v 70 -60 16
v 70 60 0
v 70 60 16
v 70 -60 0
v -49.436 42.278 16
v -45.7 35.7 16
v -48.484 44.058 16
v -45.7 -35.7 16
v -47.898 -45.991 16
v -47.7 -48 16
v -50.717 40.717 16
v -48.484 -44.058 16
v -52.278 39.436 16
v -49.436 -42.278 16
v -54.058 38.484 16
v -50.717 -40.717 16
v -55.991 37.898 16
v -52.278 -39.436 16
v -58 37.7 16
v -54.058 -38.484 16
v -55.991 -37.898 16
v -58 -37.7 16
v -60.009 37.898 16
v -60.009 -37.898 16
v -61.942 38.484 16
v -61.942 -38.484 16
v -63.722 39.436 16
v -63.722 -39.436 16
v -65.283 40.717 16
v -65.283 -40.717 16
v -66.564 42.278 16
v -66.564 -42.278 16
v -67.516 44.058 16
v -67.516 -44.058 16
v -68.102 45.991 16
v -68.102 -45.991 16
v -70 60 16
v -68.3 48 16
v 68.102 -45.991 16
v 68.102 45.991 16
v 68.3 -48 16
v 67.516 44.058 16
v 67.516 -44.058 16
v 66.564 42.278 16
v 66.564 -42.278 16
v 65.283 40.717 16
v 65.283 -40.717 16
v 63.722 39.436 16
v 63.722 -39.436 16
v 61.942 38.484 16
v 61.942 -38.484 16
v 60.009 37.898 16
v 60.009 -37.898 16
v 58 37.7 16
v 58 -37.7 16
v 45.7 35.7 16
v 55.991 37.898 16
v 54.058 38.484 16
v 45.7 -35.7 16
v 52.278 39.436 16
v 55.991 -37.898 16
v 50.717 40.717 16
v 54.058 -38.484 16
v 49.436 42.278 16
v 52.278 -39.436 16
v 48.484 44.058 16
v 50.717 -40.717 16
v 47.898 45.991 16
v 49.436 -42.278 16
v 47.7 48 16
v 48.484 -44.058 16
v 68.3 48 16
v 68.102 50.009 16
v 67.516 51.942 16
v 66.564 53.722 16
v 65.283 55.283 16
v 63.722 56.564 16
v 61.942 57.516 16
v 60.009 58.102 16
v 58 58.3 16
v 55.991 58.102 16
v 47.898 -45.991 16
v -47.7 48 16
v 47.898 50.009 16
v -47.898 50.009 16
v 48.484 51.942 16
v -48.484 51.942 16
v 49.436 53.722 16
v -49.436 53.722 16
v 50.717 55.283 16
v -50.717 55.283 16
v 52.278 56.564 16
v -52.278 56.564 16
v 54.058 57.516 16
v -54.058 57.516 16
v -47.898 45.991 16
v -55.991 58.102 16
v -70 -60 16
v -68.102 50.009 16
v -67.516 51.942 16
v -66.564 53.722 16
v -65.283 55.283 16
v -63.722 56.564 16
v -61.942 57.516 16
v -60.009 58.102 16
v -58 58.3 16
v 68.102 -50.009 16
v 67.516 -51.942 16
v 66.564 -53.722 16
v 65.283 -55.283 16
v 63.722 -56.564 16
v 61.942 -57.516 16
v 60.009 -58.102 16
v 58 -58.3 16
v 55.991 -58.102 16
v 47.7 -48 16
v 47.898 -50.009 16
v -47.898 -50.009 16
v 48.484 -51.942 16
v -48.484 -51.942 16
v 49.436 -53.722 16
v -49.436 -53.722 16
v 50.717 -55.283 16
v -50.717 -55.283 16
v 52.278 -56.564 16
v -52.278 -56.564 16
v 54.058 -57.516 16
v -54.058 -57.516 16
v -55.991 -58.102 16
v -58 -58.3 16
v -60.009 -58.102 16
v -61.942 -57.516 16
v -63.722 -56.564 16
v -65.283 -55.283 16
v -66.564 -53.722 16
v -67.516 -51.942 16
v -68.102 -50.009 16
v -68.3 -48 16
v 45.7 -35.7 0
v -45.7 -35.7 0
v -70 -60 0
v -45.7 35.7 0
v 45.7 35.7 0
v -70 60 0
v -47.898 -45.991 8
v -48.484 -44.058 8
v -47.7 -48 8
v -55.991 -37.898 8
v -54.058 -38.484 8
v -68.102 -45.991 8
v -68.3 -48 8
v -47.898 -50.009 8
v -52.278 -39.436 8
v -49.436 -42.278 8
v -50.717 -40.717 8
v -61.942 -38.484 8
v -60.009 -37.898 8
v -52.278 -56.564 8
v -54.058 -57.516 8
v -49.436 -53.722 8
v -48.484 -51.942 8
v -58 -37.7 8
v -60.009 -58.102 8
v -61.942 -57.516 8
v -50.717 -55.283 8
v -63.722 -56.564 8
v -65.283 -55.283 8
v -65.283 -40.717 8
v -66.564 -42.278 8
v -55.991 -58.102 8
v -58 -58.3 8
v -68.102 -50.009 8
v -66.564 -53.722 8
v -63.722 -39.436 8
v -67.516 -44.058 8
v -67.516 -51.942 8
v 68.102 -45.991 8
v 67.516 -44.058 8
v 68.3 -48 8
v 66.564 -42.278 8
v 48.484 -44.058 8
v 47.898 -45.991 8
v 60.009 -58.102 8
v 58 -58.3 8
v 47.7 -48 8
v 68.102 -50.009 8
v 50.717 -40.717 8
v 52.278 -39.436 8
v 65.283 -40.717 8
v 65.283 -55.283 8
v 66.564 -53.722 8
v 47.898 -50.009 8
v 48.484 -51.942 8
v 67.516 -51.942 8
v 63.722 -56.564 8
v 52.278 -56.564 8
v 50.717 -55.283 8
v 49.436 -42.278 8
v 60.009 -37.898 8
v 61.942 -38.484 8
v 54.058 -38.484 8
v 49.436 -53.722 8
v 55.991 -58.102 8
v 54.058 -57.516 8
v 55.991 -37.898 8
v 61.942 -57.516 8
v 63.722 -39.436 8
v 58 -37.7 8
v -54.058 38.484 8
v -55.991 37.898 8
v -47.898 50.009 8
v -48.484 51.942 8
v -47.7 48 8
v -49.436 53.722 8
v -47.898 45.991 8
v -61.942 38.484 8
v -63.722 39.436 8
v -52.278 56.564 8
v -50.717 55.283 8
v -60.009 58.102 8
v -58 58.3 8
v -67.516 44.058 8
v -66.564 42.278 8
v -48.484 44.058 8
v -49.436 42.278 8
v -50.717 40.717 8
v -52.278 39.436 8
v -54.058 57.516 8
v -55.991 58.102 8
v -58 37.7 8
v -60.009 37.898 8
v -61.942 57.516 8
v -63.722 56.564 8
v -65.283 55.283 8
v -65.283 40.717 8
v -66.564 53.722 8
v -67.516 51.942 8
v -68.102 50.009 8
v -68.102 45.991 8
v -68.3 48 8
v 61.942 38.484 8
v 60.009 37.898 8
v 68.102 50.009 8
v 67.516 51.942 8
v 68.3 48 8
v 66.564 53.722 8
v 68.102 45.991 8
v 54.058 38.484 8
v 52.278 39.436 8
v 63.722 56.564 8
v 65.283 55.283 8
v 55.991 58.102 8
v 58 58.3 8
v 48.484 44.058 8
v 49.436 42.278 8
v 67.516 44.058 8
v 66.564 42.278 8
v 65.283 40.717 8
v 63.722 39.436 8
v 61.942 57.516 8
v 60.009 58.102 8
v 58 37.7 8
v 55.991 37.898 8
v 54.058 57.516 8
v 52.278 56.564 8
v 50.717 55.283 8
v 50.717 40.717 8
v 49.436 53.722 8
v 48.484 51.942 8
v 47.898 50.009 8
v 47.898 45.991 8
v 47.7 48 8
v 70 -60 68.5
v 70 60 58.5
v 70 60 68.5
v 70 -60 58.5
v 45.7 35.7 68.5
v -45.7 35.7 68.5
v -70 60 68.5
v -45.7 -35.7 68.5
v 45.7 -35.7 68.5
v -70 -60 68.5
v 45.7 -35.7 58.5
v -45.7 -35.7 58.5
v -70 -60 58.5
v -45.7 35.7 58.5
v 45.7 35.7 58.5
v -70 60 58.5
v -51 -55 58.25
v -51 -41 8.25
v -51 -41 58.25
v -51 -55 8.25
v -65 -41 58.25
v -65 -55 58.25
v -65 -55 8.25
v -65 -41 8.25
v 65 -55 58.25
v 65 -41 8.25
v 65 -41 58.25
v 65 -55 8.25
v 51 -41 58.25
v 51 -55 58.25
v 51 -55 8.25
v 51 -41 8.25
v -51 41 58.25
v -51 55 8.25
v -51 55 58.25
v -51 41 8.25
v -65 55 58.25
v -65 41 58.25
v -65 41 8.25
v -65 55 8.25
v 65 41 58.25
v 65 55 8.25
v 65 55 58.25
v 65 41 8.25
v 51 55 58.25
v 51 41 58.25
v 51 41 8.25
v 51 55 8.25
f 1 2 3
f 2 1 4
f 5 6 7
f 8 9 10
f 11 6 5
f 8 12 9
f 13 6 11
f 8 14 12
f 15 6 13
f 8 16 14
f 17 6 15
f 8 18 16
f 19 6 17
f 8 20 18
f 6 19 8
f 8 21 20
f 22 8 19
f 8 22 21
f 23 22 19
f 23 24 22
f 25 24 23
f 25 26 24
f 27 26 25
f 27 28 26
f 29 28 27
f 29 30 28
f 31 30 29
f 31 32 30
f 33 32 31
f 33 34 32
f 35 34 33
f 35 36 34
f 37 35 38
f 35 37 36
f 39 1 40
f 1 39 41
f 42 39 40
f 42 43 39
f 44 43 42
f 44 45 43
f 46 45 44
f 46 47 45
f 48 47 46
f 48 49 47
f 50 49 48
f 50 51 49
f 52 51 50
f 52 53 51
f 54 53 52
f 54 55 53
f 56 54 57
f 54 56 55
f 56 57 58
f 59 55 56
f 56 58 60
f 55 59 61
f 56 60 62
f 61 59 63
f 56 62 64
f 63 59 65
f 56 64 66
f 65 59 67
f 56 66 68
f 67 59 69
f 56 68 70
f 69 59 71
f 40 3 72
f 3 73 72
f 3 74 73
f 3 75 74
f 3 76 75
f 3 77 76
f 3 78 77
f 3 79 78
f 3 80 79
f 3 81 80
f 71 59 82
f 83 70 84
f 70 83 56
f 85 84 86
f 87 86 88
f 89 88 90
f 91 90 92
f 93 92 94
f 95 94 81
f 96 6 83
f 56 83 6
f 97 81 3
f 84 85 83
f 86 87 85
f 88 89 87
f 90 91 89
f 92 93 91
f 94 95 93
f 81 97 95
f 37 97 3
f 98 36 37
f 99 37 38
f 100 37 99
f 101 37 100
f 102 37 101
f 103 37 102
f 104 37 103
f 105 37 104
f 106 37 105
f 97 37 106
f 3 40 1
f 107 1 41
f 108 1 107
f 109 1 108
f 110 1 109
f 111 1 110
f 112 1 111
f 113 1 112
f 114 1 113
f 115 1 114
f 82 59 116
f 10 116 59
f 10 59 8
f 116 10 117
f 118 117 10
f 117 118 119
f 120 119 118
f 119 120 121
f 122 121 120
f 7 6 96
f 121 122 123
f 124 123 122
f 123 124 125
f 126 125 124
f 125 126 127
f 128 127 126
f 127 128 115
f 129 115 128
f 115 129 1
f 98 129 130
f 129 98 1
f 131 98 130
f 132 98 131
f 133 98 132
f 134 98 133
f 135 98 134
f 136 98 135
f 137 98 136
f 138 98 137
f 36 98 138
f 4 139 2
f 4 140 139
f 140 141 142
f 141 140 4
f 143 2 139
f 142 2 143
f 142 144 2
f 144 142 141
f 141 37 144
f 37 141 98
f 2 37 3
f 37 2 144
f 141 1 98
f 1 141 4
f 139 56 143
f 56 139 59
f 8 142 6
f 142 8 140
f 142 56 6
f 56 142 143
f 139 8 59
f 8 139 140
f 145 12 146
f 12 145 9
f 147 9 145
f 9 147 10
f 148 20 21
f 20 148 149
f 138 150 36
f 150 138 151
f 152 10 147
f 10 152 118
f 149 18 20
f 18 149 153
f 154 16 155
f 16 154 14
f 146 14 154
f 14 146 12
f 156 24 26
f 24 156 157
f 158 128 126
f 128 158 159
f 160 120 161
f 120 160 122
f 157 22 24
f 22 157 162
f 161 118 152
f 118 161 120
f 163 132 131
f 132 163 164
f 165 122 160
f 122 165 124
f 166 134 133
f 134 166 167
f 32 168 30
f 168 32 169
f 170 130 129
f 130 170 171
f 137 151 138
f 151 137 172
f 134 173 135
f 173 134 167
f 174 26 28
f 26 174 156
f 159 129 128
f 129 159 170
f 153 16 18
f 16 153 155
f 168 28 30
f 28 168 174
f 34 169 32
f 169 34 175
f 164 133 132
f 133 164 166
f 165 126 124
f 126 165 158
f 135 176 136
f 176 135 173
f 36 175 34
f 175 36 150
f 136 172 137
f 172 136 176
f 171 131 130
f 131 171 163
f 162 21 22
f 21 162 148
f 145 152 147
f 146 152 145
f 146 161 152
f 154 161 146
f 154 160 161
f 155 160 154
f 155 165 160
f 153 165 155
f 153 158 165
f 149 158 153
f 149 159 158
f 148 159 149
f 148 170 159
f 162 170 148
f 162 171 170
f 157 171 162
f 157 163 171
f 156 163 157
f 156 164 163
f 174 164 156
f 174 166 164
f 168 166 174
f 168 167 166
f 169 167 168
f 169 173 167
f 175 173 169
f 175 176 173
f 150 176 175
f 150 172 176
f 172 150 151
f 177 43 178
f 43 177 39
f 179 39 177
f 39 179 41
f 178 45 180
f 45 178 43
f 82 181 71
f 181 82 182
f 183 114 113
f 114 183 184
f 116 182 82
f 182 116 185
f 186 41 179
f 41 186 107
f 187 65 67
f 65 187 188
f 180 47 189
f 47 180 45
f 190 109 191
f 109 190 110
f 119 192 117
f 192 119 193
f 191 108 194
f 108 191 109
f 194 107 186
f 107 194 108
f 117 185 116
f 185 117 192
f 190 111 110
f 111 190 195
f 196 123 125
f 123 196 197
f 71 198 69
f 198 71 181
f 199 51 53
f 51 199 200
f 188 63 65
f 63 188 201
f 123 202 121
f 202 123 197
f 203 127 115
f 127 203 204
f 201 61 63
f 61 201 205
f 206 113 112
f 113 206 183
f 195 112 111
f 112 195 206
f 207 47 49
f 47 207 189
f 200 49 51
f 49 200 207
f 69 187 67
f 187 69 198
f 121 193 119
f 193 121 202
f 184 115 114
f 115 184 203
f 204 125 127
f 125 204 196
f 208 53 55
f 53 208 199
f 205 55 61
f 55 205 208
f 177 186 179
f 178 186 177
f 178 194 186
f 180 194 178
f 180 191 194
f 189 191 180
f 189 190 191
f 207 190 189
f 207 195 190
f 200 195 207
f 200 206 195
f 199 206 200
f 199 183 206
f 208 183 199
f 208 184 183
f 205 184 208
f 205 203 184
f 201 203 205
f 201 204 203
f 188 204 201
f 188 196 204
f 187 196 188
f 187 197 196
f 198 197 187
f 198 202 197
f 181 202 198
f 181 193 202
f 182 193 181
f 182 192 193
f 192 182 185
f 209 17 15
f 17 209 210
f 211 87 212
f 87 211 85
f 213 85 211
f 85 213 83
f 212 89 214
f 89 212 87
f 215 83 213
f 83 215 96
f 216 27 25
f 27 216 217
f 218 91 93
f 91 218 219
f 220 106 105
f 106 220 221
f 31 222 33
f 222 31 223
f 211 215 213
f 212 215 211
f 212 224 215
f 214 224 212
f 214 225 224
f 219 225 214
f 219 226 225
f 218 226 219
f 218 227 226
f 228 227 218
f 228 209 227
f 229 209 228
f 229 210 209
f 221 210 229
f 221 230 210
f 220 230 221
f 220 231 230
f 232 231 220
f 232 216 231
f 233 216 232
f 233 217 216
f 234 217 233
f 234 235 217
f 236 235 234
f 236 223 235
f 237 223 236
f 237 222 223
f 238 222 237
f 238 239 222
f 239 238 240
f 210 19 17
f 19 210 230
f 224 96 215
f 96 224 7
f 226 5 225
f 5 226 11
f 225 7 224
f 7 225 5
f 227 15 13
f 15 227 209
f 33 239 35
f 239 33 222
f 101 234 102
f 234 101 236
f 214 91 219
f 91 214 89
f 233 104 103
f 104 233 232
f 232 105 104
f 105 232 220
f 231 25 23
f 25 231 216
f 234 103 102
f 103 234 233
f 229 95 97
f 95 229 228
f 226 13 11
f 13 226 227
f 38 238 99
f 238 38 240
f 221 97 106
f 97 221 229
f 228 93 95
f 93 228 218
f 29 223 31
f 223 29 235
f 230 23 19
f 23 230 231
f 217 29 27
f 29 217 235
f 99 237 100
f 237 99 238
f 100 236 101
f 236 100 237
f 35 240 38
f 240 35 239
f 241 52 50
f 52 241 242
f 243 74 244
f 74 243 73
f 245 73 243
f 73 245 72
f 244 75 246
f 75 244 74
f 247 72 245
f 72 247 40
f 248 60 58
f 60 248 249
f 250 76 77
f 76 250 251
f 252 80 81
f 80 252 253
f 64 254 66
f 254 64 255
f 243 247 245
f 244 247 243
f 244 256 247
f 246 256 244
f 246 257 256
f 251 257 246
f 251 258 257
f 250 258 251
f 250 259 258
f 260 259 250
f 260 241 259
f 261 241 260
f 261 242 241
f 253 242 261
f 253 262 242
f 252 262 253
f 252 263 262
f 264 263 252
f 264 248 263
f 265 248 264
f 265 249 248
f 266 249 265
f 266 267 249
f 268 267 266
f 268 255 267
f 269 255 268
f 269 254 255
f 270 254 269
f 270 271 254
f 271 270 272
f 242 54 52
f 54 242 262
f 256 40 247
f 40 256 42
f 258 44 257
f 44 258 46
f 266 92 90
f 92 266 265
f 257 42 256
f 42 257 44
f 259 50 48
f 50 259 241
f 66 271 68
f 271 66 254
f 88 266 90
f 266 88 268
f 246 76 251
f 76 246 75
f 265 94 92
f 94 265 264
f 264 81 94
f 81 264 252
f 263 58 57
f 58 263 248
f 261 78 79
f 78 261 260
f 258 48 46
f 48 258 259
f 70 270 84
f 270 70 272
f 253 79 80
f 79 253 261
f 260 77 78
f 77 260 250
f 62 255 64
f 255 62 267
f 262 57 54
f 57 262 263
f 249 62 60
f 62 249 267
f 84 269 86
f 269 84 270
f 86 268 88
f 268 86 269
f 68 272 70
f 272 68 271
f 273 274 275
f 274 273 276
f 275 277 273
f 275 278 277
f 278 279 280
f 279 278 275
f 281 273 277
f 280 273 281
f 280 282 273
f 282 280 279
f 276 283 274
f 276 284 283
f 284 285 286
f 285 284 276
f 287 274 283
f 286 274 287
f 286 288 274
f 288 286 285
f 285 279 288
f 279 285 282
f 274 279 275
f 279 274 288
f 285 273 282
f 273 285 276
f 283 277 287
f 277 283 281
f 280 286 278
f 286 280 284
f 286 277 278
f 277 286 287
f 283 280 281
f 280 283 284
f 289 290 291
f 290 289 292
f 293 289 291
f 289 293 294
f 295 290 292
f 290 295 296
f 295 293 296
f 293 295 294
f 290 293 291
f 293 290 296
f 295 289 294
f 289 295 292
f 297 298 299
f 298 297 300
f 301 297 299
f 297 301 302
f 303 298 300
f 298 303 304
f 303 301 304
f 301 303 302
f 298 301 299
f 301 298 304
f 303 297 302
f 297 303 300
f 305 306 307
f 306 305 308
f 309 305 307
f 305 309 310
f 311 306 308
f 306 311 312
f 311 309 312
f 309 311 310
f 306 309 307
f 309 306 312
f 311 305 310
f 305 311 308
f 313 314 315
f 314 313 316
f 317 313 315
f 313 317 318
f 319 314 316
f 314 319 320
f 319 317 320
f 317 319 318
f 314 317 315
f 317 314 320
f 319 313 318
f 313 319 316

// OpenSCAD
$fn = 32;

// ------------------------------------------------------------------------
// Frame cube: base 140 x 120 mm, posts 50 mm tall
// Every part is its own module, assembly() places every instance.
// ------------------------------------------------------------------------

// --- part 1 ---
module base_frame() {
  difference() {
    translate([-70, -60, 0]) cube([140, 120, 16]);
    translate([-45.7, -35.7, -1]) cube([91.4, 71.4, 18]);
    translate([-58, -48, 8]) cylinder(h = 9, d = 20.6);
    translate([58, -48, 8]) cylinder(h = 9, d = 20.6);
    translate([-58, 48, 8]) cylinder(h = 9, d = 20.6);
    translate([58, 48, 8]) cylinder(h = 9, d = 20.6);
  }
}

// --- part 2 ---
module corner_post() {
  translate([-7, -7, 0]) cube([14, 14, 50]);
}

// --- part 3 ---
module top_frame() {
  difference() {
    translate([-70, -60, 0]) cube([140, 120, 10]);
    translate([-45.7, -35.7, -1]) cube([91.4, 71.4, 12]);
  }
}

// --- assembly ---
module assembly() {
  color([0.80, 0.24, 0.20]) translate([0, 0, 0]) rotate([0, 0, 0]) base_frame();
  color([0.20, 0.45, 0.75]) translate([-58, -48, 8.25]) rotate([0, 0, 0]) corner_post();
  color([0.25, 0.62, 0.32]) translate([58, -48, 8.25]) rotate([0, 0, 0]) corner_post();
  color([0.92, 0.70, 0.18]) translate([-58, 48, 8.25]) rotate([0, 0, 0]) corner_post();
  color([0.58, 0.35, 0.70]) translate([58, 48, 8.25]) rotate([0, 0, 0]) corner_post();
  color([0.16, 0.66, 0.66]) translate([0, 0, 58.5]) rotate([0, 0, 0]) top_frame();
}

assembly();
